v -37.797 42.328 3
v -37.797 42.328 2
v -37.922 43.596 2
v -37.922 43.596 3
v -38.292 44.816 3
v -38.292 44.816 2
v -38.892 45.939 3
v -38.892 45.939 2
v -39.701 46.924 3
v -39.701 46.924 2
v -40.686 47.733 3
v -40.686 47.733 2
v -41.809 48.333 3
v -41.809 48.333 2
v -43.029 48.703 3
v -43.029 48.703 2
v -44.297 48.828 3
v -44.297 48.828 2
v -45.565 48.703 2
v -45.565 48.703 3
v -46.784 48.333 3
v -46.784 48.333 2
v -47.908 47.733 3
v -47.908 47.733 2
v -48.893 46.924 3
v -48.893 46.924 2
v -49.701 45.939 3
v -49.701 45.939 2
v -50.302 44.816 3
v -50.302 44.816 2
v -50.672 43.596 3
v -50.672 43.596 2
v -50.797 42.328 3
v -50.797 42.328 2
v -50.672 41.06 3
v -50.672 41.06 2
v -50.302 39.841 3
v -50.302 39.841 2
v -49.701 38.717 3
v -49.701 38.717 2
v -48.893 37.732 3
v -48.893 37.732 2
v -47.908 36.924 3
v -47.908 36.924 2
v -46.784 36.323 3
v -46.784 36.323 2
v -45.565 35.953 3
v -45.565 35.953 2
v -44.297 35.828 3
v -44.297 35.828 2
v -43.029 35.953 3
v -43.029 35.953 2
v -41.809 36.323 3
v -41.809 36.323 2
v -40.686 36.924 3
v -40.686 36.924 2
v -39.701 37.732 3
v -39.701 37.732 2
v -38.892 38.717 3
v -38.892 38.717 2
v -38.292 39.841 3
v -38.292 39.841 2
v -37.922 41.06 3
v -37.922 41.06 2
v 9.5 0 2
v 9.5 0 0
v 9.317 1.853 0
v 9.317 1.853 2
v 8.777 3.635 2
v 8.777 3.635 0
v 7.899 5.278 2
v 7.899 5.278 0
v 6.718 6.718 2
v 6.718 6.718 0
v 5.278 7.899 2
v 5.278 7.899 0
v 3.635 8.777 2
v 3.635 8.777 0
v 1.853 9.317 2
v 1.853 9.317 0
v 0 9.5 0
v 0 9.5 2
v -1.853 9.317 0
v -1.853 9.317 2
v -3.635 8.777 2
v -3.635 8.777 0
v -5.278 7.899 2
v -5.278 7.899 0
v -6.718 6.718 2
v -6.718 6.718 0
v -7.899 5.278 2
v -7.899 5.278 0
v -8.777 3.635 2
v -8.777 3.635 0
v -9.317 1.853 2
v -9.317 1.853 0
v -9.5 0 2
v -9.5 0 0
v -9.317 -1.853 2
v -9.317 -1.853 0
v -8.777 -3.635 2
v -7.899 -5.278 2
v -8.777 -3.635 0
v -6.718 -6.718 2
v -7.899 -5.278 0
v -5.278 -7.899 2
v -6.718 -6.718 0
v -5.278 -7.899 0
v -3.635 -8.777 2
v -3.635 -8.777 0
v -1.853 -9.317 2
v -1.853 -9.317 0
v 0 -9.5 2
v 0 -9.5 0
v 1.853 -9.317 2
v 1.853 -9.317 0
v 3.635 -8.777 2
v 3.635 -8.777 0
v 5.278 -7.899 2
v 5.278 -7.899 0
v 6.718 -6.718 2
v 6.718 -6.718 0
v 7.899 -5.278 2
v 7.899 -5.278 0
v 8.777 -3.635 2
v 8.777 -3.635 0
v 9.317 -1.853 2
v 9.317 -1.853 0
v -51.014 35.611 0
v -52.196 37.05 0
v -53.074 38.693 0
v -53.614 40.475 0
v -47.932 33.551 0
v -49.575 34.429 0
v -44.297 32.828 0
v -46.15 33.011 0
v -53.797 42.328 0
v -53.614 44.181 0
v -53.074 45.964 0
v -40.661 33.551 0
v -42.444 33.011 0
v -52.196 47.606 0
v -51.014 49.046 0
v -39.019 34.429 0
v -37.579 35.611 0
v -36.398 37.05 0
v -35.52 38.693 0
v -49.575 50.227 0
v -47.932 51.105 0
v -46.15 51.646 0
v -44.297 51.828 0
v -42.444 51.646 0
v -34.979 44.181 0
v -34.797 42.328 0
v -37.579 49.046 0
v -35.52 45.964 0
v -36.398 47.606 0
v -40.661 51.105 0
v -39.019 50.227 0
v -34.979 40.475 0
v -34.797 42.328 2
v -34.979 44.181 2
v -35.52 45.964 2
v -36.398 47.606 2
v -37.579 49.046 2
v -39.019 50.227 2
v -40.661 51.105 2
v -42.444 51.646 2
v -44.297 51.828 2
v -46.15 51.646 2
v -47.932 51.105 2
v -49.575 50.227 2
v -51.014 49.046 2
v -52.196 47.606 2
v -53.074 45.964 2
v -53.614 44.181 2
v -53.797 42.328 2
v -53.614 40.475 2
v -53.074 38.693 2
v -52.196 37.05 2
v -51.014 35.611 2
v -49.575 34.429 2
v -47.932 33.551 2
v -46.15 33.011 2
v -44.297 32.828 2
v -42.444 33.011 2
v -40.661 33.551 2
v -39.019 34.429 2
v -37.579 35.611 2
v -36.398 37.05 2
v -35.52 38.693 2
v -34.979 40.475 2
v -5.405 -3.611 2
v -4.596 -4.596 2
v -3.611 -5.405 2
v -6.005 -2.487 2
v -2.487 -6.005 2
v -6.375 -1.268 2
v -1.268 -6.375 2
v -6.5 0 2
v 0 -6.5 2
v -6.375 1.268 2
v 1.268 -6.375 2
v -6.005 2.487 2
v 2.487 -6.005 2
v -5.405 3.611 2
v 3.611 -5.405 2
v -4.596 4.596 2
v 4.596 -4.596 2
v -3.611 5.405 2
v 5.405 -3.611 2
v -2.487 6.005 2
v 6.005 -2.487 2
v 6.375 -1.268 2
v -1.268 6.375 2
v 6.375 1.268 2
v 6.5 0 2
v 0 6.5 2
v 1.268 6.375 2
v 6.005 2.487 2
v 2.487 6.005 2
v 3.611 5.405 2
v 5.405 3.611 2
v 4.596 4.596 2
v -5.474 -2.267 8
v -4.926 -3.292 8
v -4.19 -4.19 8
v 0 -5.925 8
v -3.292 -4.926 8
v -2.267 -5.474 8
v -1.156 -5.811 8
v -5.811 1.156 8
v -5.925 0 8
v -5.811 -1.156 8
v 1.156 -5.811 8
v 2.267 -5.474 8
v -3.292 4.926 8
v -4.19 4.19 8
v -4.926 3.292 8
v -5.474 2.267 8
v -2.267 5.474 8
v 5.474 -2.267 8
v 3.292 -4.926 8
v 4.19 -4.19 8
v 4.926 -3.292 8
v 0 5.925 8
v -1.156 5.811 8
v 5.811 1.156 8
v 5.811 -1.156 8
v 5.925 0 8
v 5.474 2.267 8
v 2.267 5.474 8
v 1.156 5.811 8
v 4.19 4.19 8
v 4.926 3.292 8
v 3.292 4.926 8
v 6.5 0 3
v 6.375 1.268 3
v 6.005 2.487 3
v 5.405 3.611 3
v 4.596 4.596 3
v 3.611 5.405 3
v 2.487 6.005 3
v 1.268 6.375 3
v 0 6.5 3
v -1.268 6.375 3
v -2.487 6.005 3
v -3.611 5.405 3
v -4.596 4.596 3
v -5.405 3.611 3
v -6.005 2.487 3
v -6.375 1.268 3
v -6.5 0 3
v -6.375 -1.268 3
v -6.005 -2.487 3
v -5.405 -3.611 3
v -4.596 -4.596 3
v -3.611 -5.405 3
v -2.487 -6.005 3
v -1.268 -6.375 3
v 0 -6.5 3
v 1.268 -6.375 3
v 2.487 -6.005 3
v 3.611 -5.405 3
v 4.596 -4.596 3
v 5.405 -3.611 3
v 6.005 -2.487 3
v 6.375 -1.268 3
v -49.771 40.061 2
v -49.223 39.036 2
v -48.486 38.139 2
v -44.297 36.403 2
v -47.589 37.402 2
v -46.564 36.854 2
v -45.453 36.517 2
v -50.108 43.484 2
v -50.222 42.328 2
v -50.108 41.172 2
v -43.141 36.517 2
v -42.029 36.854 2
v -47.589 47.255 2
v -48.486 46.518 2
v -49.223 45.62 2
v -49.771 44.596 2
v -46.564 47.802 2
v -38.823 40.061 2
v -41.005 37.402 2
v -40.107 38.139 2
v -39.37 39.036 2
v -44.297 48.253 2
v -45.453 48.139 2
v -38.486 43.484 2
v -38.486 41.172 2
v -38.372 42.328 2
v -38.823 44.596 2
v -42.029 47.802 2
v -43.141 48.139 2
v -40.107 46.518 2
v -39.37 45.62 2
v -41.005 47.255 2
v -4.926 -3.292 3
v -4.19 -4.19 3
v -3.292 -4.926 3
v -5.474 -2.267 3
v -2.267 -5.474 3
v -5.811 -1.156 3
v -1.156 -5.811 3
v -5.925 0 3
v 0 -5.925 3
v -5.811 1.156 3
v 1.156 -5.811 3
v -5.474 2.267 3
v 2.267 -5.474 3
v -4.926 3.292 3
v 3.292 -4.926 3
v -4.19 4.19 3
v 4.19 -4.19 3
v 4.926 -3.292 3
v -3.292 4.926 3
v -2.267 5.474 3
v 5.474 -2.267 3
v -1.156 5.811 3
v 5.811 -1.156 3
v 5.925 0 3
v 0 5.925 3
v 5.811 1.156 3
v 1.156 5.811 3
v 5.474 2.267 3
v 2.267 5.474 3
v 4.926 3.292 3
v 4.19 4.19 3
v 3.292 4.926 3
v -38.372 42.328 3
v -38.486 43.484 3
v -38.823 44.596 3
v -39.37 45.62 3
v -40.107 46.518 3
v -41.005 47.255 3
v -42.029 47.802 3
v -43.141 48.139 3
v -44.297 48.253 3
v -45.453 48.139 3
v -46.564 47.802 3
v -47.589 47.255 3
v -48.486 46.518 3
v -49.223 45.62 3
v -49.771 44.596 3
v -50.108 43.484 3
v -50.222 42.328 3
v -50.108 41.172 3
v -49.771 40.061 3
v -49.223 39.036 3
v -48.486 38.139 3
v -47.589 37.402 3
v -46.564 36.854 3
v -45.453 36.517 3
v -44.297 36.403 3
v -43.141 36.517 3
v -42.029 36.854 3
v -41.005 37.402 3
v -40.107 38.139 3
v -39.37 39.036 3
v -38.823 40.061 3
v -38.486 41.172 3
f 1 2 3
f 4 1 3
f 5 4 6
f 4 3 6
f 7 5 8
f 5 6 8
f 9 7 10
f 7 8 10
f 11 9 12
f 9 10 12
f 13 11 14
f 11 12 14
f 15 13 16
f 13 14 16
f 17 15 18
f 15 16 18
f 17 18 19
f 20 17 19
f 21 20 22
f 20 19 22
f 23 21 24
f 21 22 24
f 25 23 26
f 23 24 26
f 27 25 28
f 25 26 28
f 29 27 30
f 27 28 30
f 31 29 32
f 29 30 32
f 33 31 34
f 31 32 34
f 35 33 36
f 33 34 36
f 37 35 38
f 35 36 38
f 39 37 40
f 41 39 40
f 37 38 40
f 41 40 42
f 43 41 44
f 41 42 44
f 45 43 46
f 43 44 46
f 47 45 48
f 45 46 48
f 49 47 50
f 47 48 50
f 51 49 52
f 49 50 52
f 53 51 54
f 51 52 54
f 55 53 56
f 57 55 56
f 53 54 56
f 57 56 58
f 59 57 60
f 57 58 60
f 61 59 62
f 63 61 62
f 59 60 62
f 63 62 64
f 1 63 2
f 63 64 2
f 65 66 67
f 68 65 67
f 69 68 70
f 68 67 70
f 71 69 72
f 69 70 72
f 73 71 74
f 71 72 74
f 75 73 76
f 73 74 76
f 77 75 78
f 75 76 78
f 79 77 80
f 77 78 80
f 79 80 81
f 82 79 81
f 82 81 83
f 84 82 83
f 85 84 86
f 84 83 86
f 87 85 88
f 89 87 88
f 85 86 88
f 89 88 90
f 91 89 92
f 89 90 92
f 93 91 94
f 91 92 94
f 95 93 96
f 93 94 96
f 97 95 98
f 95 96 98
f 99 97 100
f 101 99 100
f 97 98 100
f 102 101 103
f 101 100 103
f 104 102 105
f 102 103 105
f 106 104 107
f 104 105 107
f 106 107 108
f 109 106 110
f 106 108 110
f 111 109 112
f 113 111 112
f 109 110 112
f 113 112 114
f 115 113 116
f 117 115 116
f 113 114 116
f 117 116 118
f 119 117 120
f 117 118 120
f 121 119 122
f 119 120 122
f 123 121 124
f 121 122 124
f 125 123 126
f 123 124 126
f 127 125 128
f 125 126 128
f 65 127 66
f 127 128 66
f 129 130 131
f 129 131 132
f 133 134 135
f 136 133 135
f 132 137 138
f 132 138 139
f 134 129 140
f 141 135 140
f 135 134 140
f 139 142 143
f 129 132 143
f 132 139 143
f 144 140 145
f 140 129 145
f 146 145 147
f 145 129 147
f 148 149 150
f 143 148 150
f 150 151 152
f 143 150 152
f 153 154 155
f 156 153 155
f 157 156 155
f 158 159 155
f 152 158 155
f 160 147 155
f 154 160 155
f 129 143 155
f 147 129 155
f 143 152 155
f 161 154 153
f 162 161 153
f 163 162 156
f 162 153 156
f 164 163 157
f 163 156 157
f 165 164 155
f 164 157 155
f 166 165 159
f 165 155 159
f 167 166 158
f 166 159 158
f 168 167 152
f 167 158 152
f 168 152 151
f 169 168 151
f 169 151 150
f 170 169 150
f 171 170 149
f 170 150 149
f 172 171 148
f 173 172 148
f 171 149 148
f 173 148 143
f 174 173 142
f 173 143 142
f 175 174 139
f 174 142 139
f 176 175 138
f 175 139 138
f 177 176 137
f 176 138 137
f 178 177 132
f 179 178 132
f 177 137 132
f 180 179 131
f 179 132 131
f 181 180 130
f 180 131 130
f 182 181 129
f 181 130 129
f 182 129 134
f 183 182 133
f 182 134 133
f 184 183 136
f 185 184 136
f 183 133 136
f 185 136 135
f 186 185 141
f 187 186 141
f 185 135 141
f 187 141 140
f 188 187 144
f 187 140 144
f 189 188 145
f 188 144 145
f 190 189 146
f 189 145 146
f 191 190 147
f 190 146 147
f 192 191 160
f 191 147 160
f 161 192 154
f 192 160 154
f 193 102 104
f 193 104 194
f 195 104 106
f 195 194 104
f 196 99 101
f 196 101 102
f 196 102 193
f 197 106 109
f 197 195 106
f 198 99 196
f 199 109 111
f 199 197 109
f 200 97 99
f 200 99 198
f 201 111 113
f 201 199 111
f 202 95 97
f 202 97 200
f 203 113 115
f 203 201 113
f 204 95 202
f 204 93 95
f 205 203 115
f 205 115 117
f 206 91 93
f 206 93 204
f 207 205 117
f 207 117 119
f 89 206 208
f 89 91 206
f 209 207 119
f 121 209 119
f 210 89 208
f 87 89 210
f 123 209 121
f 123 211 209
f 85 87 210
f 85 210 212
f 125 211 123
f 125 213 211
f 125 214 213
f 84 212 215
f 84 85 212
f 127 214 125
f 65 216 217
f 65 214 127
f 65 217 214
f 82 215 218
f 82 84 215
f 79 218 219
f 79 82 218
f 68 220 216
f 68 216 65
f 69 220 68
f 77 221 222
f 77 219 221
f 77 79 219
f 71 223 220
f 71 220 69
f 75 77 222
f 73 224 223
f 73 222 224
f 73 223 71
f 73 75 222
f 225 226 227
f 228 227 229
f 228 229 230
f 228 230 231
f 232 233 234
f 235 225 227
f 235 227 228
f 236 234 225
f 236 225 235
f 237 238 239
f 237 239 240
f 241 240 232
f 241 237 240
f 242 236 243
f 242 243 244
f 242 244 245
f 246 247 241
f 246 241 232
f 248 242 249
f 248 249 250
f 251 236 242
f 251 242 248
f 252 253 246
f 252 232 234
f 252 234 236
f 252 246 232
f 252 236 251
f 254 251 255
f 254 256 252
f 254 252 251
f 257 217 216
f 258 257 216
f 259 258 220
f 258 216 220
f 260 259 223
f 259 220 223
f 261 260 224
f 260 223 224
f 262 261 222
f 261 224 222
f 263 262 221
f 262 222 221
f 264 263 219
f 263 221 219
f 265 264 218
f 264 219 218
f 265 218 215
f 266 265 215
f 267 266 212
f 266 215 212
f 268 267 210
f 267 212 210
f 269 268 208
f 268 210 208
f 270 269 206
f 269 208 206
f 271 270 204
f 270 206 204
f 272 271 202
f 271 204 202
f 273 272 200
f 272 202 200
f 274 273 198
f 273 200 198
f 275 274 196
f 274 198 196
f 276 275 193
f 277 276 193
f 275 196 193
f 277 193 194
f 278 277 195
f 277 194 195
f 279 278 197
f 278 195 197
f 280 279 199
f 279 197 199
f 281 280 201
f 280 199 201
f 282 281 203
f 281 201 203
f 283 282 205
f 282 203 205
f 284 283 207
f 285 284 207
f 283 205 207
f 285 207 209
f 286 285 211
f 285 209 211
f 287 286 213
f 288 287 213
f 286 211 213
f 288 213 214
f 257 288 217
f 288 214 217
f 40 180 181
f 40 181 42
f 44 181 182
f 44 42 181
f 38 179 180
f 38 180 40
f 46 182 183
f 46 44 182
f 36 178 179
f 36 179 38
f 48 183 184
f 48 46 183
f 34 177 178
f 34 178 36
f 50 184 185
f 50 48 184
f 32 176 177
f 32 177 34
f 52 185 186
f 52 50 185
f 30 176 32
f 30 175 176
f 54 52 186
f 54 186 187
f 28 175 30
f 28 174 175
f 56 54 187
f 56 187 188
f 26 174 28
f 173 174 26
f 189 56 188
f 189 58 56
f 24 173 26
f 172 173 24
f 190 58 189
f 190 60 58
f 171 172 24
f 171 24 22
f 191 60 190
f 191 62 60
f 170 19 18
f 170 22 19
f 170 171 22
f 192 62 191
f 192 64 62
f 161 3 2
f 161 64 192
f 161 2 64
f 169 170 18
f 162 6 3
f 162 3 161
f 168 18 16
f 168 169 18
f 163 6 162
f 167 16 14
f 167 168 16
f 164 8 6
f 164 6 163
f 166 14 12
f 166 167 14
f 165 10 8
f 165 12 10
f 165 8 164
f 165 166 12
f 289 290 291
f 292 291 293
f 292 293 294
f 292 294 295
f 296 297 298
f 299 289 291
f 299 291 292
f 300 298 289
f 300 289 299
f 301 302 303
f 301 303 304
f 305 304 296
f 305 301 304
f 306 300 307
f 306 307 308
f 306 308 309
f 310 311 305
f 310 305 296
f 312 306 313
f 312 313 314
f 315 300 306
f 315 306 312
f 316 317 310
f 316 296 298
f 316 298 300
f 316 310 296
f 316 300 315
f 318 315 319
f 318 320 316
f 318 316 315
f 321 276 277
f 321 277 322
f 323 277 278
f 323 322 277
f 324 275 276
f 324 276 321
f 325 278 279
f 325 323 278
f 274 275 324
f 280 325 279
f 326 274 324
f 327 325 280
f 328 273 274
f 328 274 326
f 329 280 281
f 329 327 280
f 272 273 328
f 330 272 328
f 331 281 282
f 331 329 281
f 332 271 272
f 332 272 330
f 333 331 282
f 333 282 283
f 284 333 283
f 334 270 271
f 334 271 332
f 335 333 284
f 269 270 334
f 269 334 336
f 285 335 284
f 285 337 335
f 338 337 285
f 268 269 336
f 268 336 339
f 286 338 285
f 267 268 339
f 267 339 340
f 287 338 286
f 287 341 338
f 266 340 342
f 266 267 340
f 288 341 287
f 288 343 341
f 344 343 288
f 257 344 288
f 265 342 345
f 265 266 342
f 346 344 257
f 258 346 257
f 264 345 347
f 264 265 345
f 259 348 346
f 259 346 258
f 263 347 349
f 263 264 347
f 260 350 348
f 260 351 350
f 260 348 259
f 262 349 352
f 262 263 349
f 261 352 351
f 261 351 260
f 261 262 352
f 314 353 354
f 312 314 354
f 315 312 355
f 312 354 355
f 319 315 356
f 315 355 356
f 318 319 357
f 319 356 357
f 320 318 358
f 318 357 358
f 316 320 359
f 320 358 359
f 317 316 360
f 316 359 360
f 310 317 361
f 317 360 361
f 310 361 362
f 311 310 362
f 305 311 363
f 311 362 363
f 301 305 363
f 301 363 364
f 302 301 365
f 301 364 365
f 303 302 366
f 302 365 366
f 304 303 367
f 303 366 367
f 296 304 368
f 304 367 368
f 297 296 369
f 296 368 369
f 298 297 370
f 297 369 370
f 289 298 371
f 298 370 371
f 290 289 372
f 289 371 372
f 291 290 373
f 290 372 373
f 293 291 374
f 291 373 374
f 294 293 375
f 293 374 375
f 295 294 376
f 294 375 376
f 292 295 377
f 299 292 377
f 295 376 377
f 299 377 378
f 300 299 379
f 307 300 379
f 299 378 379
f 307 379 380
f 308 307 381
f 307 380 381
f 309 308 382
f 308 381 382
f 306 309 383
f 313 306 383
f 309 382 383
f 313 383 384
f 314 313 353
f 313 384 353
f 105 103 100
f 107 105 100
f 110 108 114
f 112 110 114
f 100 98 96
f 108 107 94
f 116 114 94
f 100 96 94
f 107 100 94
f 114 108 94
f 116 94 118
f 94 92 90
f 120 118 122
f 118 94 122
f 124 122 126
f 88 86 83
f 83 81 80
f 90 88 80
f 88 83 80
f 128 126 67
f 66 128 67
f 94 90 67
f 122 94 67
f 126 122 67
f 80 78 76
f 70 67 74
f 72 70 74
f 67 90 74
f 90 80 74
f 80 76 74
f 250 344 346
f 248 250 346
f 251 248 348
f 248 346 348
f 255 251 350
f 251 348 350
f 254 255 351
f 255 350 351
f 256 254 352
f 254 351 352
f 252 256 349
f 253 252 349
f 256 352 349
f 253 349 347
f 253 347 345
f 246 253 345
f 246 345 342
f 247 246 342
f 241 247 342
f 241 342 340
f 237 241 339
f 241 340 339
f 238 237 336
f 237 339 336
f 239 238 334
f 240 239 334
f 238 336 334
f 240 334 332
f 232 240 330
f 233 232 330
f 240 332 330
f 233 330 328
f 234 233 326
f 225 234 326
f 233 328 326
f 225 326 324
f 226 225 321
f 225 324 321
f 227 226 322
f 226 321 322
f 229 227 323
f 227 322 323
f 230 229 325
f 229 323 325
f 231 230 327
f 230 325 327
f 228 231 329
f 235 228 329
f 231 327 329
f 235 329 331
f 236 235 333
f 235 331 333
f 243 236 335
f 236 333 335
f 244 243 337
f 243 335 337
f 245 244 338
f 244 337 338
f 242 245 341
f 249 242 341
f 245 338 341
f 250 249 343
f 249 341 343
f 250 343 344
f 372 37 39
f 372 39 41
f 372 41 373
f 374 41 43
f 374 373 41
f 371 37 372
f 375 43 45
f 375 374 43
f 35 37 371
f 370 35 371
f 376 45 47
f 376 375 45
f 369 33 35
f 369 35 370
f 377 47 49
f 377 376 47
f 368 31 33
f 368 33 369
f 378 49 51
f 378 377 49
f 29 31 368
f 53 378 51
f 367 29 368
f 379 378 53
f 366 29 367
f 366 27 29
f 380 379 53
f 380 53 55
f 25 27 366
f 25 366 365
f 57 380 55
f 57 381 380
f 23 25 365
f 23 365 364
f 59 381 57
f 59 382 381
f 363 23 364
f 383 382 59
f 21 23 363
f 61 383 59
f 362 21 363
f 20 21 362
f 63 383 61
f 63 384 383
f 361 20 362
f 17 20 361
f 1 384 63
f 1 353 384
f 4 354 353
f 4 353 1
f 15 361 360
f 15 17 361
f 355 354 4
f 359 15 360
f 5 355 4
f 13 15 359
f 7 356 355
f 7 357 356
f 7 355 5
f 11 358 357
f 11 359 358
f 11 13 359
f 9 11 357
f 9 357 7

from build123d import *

# Parameters (mm, degrees)
F0_R      = 9.5
F1_DEPTH  = 2
F2_R      = 6.5
F3_DEPTH  = 1
F4_R      = 5.925
F5_DEPTH  = 5
F6_R      = 9.5
F7_DEPTH  = 2
F8_R      = 6.5
F9_DEPTH  = 1
F10_R     = 5.925
F11_DEPTH = 1


with BuildPart() as f1:
    # F0 (on Top) → F1 (new body)
    with BuildSketch(Plane.XY):
        Circle(F0_R)
    extrude(amount=F1_DEPTH)

    # F2 (on face) → F3 (join)
    with BuildSketch(Plane.XY.offset(2)):
        Circle(F2_R)
    extrude(amount=F3_DEPTH)

    # F4 (on face) → F5 (join)
    with BuildSketch(Plane.XY.offset(3)):
        Circle(F4_R)
    extrude(amount=F5_DEPTH)


with BuildPart() as f7:
    # F6 (on Top) → F7 (new body)
    with BuildSketch(Plane.XY):
        with Locations((-44.296876, 42.328127)):
            Circle(F6_R)
    extrude(amount=F7_DEPTH)

    # F8 (on face) → F9 (join)
    with BuildSketch(Plane.XY.offset(2)):
        with Locations((-44.296876, 42.328127)):
            Circle(F8_R)
    extrude(amount=F9_DEPTH)

    # F10 (on face) → F11 (cut)
    with BuildSketch(Plane.XY.offset(3)):
        with Locations((-44.296876, 42.328127)):
            Circle(F10_R)
    extrude(amount=-F11_DEPTH, mode=Mode.SUBTRACT)


solid = Compound([f1.part, f7.part])
